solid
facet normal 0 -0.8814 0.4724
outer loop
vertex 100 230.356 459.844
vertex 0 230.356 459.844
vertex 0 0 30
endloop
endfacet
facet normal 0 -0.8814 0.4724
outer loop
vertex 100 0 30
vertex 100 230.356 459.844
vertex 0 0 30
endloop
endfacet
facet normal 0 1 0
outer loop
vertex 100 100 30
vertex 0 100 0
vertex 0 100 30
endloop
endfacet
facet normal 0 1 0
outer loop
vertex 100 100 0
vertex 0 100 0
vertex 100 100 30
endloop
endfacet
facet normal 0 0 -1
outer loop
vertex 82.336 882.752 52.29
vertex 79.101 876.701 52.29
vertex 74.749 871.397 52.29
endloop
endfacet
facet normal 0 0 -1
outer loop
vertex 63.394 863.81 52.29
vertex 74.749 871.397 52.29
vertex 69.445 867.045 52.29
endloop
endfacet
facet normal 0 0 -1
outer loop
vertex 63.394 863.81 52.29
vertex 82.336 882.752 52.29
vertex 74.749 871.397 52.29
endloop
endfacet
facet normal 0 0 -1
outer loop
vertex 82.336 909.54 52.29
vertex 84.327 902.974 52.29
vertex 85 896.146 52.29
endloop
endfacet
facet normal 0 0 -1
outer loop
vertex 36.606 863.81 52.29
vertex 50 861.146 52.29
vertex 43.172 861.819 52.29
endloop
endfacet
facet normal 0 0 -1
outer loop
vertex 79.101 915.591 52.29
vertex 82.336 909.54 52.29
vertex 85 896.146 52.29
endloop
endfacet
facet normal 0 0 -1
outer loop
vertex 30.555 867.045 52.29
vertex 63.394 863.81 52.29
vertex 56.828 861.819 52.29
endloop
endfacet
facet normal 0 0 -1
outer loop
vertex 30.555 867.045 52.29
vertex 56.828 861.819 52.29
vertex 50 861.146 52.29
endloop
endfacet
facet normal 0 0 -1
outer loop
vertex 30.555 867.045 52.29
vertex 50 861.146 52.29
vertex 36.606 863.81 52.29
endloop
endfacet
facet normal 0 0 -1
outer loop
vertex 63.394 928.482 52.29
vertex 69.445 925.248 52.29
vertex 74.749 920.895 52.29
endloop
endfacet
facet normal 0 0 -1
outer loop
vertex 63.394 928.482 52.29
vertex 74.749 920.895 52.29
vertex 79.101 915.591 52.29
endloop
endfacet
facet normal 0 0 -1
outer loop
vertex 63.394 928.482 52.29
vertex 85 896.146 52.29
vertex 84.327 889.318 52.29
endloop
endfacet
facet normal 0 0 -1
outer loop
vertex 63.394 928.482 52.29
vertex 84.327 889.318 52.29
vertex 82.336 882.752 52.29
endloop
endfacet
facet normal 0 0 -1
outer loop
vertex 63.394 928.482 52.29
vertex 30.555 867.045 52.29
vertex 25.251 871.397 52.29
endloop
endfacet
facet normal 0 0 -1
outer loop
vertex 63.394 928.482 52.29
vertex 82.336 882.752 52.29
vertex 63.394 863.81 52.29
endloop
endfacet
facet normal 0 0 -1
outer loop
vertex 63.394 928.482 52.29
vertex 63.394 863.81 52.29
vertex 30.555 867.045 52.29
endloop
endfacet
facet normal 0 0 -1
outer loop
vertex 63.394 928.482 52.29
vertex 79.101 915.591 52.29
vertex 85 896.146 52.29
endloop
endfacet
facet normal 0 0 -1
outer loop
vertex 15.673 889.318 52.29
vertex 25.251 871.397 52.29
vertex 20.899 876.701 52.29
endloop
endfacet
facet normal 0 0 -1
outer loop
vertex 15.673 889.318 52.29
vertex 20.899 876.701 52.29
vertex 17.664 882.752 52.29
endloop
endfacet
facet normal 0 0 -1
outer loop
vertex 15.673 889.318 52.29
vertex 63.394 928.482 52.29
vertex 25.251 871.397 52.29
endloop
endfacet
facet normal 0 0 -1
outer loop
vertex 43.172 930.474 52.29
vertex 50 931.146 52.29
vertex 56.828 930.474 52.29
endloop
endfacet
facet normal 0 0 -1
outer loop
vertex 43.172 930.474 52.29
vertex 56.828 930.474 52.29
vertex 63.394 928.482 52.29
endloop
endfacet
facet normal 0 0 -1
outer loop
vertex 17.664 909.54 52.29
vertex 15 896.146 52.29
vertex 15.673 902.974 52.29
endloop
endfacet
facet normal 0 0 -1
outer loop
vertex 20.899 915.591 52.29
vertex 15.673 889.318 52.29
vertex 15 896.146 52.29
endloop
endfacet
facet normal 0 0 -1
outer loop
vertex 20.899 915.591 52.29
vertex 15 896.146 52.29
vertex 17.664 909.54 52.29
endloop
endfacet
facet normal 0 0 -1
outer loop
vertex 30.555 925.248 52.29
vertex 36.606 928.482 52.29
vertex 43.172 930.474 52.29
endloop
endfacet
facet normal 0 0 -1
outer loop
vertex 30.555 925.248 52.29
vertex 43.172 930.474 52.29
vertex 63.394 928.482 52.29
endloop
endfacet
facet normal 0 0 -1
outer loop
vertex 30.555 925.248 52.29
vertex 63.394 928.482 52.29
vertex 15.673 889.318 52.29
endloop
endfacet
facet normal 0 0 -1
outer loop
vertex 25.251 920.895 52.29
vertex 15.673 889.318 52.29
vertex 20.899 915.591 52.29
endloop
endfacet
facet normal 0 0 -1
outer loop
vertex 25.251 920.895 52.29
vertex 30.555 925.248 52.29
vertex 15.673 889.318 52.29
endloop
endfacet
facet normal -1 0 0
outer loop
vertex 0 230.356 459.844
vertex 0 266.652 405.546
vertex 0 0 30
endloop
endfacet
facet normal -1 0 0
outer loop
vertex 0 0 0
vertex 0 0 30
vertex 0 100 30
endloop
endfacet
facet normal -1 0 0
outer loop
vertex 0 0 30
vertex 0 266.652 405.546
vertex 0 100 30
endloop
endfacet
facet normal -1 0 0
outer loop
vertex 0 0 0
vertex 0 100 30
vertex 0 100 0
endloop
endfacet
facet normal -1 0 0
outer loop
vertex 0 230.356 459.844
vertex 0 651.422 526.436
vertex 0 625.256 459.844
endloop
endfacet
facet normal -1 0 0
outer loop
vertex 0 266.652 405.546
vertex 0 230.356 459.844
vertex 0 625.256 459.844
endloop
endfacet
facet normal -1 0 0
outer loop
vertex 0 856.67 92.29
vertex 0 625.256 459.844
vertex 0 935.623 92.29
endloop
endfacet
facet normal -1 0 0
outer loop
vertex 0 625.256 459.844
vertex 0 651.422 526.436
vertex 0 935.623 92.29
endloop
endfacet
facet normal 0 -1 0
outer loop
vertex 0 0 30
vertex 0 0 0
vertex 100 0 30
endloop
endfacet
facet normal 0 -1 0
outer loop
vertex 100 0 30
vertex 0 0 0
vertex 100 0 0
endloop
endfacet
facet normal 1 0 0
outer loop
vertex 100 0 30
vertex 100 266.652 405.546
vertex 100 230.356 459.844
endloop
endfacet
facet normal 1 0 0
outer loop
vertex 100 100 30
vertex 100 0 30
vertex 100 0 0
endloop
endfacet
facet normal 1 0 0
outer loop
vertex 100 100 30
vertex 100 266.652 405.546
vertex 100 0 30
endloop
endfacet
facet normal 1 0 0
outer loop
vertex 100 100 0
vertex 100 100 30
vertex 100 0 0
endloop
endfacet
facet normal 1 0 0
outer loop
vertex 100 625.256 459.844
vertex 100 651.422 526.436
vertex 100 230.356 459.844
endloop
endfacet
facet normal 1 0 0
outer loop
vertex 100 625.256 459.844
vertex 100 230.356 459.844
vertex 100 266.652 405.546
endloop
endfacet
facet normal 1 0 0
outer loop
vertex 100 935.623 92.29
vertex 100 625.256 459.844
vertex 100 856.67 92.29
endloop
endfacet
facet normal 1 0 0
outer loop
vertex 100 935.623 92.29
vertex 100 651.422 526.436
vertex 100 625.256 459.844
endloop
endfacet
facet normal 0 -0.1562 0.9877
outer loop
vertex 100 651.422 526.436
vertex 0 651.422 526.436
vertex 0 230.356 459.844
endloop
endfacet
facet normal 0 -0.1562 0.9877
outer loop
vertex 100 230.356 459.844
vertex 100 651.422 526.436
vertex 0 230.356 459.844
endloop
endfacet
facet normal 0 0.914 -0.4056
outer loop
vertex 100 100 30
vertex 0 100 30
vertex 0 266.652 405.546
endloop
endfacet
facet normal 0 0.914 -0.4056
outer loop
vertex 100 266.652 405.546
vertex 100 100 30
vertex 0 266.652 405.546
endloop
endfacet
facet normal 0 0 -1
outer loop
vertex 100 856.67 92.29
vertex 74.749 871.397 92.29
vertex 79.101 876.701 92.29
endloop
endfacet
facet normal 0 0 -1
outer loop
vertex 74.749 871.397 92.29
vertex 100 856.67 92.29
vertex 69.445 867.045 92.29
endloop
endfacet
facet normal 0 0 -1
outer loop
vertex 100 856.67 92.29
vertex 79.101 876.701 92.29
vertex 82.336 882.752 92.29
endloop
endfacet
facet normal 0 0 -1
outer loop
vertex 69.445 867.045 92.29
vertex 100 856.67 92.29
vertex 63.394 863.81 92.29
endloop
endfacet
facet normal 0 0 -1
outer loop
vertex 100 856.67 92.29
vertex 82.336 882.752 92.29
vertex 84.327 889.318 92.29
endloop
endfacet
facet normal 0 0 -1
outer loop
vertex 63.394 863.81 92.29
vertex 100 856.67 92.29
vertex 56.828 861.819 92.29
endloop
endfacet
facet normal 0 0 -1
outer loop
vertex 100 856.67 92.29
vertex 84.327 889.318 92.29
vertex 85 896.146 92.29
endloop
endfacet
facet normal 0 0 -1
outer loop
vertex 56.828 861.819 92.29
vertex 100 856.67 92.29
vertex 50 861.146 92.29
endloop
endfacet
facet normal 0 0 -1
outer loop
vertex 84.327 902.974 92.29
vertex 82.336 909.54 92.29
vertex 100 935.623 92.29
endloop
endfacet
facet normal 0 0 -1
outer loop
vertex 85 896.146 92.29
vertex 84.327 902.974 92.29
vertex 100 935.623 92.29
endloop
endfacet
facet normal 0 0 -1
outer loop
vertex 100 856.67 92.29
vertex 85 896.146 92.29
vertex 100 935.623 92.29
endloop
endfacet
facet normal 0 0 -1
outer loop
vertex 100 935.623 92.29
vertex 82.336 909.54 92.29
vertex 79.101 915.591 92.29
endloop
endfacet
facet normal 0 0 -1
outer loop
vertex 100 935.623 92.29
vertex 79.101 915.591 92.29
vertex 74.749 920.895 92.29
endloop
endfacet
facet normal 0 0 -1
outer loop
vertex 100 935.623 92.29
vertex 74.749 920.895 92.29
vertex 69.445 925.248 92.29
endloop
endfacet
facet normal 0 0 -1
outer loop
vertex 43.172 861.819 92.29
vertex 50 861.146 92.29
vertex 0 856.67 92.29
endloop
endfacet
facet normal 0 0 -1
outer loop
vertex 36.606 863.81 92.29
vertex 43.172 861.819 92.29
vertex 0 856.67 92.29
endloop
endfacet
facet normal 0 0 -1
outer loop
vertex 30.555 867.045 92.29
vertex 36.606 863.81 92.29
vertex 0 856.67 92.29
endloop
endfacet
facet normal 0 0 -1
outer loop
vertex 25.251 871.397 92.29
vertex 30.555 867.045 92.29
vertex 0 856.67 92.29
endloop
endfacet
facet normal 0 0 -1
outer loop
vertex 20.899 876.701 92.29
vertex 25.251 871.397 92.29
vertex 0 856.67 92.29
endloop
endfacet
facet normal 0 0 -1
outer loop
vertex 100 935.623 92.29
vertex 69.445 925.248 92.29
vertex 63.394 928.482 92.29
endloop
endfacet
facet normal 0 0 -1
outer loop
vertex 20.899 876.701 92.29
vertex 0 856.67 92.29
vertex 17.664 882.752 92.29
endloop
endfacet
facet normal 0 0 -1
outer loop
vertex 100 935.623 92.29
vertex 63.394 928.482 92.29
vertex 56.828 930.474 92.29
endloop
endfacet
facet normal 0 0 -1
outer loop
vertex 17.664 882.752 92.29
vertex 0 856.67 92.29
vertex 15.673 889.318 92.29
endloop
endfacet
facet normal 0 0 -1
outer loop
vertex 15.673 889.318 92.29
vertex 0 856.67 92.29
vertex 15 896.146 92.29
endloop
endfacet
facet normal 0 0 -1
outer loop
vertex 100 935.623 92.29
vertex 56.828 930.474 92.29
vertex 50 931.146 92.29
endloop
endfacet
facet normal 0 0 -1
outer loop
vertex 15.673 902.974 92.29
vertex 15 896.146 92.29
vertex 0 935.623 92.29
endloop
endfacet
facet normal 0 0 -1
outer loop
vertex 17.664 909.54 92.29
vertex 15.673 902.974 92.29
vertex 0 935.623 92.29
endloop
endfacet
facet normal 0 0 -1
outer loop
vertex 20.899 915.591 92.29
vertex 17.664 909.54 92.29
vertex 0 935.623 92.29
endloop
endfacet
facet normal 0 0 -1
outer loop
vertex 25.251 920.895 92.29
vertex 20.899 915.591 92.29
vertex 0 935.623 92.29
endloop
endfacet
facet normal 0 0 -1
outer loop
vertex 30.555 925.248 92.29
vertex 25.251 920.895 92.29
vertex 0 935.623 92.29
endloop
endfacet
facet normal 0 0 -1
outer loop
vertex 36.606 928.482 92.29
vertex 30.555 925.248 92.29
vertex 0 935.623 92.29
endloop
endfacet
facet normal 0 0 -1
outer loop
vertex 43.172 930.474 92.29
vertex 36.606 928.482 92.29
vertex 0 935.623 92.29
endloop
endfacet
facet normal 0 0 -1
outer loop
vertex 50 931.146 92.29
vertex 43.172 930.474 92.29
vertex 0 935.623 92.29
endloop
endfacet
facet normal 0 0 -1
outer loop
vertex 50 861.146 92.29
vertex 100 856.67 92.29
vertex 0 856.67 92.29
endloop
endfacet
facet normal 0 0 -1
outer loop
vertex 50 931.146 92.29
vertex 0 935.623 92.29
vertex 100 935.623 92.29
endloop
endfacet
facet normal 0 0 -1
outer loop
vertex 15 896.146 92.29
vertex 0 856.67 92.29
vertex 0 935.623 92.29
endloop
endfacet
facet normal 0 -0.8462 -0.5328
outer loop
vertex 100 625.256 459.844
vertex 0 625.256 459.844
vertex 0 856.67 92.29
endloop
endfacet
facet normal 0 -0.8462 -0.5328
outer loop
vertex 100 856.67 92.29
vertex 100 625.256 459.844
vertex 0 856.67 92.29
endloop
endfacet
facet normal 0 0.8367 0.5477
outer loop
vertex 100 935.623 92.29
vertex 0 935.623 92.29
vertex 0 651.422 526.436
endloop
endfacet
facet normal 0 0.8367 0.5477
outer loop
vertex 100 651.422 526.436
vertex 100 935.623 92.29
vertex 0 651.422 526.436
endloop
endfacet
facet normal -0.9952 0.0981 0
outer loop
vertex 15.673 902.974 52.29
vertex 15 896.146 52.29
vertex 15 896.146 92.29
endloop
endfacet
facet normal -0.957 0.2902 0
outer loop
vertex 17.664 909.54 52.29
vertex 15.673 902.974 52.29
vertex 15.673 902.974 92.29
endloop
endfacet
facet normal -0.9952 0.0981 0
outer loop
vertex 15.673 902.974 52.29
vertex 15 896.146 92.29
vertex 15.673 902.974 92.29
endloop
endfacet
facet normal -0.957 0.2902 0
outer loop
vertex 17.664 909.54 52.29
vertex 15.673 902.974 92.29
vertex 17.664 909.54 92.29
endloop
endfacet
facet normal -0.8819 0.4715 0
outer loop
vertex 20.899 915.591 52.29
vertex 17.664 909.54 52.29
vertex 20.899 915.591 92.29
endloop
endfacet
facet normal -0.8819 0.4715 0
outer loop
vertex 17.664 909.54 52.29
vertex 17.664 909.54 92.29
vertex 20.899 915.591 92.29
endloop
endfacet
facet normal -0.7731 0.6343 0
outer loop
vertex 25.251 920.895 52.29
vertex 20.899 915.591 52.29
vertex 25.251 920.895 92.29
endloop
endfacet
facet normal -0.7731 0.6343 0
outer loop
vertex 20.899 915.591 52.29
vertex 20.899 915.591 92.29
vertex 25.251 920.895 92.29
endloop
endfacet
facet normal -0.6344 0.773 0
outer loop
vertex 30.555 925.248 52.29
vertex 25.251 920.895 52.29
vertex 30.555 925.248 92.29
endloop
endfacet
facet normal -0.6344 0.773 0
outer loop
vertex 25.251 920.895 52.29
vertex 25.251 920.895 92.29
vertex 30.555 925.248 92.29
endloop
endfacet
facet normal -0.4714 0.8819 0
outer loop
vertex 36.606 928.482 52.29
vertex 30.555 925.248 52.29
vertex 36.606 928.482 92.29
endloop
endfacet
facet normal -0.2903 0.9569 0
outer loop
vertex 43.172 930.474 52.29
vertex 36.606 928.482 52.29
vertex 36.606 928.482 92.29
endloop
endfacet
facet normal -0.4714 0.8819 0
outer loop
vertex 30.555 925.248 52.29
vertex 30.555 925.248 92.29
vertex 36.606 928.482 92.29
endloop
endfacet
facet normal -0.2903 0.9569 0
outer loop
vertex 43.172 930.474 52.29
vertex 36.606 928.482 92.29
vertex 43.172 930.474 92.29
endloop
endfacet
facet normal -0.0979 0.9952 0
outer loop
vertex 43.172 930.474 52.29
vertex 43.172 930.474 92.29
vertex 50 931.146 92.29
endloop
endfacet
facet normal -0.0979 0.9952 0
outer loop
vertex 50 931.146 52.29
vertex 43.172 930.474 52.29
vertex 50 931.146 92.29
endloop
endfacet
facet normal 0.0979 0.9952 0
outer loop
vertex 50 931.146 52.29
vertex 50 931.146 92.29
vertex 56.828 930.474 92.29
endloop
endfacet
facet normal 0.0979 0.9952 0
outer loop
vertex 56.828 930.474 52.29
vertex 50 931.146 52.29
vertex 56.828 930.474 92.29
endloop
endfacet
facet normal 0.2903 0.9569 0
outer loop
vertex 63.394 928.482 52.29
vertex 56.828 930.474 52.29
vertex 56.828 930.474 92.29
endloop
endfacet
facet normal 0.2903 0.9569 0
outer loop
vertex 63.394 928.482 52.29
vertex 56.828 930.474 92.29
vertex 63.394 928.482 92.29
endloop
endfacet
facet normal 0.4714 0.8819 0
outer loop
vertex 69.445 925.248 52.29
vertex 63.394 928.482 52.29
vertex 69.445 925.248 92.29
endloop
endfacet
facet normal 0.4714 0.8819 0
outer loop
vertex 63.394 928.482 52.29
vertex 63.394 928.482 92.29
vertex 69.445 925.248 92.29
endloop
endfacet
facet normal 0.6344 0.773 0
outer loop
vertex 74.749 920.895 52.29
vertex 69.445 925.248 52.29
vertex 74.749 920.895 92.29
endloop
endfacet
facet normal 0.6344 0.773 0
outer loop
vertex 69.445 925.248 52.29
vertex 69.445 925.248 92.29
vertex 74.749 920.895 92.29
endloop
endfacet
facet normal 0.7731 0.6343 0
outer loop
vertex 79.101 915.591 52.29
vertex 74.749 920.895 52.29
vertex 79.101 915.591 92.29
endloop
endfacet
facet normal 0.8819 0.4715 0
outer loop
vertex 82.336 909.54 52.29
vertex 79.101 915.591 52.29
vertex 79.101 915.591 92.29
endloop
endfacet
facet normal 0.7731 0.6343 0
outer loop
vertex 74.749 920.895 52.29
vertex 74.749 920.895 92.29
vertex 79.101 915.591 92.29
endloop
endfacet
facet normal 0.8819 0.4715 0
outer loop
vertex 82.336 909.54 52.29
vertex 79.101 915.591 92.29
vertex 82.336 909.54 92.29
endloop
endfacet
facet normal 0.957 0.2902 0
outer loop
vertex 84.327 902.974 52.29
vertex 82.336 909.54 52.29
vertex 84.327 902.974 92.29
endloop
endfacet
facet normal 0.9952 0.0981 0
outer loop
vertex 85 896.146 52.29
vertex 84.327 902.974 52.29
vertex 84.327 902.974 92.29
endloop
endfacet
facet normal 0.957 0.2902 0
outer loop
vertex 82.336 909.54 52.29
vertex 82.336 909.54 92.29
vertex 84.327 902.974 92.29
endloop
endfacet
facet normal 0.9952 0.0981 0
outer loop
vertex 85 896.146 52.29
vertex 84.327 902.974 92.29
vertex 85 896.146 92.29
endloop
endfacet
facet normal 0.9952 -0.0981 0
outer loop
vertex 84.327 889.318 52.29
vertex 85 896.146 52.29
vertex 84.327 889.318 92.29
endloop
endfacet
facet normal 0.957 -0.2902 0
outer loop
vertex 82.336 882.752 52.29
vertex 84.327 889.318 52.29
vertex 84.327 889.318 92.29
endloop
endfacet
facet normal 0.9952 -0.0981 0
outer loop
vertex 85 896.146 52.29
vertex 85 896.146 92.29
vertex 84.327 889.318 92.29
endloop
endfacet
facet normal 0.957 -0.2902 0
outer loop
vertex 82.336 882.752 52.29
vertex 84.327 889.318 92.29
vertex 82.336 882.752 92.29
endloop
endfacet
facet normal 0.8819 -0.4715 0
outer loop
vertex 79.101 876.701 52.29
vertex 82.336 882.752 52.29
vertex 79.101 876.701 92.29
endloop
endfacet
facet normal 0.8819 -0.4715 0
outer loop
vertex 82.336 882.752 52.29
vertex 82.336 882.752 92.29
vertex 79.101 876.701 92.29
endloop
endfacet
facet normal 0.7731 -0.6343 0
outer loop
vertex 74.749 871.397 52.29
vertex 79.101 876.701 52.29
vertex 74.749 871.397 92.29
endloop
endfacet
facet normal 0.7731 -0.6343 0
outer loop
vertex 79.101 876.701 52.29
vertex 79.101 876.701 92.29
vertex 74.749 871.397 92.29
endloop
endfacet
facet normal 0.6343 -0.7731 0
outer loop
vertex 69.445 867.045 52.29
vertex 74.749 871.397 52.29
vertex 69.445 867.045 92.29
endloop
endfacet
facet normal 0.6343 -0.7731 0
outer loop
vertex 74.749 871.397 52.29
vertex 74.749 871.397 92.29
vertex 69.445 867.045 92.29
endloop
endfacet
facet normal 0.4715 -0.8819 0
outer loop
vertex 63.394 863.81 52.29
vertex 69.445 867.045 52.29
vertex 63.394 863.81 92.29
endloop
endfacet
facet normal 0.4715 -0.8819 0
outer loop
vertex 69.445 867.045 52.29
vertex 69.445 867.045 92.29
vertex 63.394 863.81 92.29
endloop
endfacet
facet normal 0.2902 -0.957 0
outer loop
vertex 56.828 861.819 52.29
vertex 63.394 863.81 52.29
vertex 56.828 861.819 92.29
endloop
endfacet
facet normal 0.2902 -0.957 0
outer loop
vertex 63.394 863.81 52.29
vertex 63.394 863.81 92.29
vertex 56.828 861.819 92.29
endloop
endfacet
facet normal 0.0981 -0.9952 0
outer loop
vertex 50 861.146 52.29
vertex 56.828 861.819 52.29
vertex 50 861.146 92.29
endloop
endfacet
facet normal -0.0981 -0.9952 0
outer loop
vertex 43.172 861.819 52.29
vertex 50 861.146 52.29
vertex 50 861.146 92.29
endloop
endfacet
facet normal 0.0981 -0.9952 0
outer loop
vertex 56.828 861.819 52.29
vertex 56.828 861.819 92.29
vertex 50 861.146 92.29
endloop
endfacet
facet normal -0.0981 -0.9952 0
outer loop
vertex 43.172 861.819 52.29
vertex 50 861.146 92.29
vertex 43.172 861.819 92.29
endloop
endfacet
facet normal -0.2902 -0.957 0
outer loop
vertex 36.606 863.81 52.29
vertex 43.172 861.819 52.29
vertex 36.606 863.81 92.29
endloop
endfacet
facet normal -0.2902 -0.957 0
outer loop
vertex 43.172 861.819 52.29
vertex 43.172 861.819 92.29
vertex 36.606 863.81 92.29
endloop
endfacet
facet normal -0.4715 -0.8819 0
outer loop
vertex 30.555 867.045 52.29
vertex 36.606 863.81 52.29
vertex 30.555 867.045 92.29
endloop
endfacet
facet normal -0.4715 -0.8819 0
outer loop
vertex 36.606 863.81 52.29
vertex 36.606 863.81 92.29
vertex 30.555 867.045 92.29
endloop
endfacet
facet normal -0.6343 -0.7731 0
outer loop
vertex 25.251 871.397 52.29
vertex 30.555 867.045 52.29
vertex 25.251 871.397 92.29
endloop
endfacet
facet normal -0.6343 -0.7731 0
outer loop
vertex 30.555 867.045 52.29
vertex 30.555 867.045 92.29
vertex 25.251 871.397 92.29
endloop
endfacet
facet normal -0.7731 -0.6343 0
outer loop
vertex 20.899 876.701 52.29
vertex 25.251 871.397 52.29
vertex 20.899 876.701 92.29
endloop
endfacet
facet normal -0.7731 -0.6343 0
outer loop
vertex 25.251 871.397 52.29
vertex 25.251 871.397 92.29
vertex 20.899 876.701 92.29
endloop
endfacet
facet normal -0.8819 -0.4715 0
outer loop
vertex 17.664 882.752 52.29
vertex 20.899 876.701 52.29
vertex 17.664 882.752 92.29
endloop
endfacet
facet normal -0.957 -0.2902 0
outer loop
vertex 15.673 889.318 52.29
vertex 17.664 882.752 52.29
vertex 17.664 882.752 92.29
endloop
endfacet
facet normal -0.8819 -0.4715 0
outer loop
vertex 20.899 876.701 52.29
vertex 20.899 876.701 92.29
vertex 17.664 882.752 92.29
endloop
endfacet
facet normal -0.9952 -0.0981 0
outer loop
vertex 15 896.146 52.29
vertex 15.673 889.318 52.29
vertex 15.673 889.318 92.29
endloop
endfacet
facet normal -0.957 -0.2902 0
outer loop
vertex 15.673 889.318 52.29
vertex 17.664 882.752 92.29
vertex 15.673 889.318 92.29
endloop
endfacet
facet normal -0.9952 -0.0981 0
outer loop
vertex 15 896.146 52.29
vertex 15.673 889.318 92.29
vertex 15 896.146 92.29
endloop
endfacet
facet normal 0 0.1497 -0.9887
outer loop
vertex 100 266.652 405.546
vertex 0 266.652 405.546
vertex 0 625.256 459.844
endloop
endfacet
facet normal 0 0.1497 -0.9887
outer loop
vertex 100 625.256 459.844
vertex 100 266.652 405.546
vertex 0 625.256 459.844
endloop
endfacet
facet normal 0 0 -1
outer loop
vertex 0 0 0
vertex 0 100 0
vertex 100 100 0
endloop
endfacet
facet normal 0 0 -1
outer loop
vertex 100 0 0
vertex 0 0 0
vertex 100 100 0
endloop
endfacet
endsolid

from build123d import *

# Parameters (mm, degrees)
SKETCH1_W           = 100
SKETCH1_H           = 100
BOSS_EXTRUDE1_DEPTH = 30
BOSS_EXTRUDE2_DEPTH = 100
SKETCH4_R           = 35
BOSS_EXTRUDE3_DEPTH = 40


with BuildPart() as part:
    # Sketch1 → Boss-Extrude1 (new body)
    with BuildSketch(Plane.XY):
        with Locations((50, 50)):
            Rectangle(SKETCH1_W, SKETCH1_H)
    extrude(amount=BOSS_EXTRUDE1_DEPTH)

    # Sketch2 → Boss-Extrude2 (add)
    with BuildSketch(Plane(origin=(0, 0, 0), x_dir=(0, 0, -1), z_dir=(1, 0, 0))):
        Polygon((-30, 100), (-405.545697471, 266.651744151), (-459.843779827, 625.256045564), (-92.290312011, 856.669682909), (-92.290312011, 935.622570944), (-526.435767621, 651.422136489), (-459.843779827, 230.355875203), (-30, 0), align=None)
    extrude(amount=BOSS_EXTRUDE2_DEPTH)

    # Sketch4 → Boss-Extrude3 (add)
    with BuildSketch(Plane(origin=(0, 0, 92.290312011), x_dir=(-1, 0, 0), z_dir=(0, 0, -1))):
        with Locations((-50, 896.146126927)):
            Circle(SKETCH4_R)
    extrude(amount=BOSS_EXTRUDE3_DEPTH)


solid = part.part
